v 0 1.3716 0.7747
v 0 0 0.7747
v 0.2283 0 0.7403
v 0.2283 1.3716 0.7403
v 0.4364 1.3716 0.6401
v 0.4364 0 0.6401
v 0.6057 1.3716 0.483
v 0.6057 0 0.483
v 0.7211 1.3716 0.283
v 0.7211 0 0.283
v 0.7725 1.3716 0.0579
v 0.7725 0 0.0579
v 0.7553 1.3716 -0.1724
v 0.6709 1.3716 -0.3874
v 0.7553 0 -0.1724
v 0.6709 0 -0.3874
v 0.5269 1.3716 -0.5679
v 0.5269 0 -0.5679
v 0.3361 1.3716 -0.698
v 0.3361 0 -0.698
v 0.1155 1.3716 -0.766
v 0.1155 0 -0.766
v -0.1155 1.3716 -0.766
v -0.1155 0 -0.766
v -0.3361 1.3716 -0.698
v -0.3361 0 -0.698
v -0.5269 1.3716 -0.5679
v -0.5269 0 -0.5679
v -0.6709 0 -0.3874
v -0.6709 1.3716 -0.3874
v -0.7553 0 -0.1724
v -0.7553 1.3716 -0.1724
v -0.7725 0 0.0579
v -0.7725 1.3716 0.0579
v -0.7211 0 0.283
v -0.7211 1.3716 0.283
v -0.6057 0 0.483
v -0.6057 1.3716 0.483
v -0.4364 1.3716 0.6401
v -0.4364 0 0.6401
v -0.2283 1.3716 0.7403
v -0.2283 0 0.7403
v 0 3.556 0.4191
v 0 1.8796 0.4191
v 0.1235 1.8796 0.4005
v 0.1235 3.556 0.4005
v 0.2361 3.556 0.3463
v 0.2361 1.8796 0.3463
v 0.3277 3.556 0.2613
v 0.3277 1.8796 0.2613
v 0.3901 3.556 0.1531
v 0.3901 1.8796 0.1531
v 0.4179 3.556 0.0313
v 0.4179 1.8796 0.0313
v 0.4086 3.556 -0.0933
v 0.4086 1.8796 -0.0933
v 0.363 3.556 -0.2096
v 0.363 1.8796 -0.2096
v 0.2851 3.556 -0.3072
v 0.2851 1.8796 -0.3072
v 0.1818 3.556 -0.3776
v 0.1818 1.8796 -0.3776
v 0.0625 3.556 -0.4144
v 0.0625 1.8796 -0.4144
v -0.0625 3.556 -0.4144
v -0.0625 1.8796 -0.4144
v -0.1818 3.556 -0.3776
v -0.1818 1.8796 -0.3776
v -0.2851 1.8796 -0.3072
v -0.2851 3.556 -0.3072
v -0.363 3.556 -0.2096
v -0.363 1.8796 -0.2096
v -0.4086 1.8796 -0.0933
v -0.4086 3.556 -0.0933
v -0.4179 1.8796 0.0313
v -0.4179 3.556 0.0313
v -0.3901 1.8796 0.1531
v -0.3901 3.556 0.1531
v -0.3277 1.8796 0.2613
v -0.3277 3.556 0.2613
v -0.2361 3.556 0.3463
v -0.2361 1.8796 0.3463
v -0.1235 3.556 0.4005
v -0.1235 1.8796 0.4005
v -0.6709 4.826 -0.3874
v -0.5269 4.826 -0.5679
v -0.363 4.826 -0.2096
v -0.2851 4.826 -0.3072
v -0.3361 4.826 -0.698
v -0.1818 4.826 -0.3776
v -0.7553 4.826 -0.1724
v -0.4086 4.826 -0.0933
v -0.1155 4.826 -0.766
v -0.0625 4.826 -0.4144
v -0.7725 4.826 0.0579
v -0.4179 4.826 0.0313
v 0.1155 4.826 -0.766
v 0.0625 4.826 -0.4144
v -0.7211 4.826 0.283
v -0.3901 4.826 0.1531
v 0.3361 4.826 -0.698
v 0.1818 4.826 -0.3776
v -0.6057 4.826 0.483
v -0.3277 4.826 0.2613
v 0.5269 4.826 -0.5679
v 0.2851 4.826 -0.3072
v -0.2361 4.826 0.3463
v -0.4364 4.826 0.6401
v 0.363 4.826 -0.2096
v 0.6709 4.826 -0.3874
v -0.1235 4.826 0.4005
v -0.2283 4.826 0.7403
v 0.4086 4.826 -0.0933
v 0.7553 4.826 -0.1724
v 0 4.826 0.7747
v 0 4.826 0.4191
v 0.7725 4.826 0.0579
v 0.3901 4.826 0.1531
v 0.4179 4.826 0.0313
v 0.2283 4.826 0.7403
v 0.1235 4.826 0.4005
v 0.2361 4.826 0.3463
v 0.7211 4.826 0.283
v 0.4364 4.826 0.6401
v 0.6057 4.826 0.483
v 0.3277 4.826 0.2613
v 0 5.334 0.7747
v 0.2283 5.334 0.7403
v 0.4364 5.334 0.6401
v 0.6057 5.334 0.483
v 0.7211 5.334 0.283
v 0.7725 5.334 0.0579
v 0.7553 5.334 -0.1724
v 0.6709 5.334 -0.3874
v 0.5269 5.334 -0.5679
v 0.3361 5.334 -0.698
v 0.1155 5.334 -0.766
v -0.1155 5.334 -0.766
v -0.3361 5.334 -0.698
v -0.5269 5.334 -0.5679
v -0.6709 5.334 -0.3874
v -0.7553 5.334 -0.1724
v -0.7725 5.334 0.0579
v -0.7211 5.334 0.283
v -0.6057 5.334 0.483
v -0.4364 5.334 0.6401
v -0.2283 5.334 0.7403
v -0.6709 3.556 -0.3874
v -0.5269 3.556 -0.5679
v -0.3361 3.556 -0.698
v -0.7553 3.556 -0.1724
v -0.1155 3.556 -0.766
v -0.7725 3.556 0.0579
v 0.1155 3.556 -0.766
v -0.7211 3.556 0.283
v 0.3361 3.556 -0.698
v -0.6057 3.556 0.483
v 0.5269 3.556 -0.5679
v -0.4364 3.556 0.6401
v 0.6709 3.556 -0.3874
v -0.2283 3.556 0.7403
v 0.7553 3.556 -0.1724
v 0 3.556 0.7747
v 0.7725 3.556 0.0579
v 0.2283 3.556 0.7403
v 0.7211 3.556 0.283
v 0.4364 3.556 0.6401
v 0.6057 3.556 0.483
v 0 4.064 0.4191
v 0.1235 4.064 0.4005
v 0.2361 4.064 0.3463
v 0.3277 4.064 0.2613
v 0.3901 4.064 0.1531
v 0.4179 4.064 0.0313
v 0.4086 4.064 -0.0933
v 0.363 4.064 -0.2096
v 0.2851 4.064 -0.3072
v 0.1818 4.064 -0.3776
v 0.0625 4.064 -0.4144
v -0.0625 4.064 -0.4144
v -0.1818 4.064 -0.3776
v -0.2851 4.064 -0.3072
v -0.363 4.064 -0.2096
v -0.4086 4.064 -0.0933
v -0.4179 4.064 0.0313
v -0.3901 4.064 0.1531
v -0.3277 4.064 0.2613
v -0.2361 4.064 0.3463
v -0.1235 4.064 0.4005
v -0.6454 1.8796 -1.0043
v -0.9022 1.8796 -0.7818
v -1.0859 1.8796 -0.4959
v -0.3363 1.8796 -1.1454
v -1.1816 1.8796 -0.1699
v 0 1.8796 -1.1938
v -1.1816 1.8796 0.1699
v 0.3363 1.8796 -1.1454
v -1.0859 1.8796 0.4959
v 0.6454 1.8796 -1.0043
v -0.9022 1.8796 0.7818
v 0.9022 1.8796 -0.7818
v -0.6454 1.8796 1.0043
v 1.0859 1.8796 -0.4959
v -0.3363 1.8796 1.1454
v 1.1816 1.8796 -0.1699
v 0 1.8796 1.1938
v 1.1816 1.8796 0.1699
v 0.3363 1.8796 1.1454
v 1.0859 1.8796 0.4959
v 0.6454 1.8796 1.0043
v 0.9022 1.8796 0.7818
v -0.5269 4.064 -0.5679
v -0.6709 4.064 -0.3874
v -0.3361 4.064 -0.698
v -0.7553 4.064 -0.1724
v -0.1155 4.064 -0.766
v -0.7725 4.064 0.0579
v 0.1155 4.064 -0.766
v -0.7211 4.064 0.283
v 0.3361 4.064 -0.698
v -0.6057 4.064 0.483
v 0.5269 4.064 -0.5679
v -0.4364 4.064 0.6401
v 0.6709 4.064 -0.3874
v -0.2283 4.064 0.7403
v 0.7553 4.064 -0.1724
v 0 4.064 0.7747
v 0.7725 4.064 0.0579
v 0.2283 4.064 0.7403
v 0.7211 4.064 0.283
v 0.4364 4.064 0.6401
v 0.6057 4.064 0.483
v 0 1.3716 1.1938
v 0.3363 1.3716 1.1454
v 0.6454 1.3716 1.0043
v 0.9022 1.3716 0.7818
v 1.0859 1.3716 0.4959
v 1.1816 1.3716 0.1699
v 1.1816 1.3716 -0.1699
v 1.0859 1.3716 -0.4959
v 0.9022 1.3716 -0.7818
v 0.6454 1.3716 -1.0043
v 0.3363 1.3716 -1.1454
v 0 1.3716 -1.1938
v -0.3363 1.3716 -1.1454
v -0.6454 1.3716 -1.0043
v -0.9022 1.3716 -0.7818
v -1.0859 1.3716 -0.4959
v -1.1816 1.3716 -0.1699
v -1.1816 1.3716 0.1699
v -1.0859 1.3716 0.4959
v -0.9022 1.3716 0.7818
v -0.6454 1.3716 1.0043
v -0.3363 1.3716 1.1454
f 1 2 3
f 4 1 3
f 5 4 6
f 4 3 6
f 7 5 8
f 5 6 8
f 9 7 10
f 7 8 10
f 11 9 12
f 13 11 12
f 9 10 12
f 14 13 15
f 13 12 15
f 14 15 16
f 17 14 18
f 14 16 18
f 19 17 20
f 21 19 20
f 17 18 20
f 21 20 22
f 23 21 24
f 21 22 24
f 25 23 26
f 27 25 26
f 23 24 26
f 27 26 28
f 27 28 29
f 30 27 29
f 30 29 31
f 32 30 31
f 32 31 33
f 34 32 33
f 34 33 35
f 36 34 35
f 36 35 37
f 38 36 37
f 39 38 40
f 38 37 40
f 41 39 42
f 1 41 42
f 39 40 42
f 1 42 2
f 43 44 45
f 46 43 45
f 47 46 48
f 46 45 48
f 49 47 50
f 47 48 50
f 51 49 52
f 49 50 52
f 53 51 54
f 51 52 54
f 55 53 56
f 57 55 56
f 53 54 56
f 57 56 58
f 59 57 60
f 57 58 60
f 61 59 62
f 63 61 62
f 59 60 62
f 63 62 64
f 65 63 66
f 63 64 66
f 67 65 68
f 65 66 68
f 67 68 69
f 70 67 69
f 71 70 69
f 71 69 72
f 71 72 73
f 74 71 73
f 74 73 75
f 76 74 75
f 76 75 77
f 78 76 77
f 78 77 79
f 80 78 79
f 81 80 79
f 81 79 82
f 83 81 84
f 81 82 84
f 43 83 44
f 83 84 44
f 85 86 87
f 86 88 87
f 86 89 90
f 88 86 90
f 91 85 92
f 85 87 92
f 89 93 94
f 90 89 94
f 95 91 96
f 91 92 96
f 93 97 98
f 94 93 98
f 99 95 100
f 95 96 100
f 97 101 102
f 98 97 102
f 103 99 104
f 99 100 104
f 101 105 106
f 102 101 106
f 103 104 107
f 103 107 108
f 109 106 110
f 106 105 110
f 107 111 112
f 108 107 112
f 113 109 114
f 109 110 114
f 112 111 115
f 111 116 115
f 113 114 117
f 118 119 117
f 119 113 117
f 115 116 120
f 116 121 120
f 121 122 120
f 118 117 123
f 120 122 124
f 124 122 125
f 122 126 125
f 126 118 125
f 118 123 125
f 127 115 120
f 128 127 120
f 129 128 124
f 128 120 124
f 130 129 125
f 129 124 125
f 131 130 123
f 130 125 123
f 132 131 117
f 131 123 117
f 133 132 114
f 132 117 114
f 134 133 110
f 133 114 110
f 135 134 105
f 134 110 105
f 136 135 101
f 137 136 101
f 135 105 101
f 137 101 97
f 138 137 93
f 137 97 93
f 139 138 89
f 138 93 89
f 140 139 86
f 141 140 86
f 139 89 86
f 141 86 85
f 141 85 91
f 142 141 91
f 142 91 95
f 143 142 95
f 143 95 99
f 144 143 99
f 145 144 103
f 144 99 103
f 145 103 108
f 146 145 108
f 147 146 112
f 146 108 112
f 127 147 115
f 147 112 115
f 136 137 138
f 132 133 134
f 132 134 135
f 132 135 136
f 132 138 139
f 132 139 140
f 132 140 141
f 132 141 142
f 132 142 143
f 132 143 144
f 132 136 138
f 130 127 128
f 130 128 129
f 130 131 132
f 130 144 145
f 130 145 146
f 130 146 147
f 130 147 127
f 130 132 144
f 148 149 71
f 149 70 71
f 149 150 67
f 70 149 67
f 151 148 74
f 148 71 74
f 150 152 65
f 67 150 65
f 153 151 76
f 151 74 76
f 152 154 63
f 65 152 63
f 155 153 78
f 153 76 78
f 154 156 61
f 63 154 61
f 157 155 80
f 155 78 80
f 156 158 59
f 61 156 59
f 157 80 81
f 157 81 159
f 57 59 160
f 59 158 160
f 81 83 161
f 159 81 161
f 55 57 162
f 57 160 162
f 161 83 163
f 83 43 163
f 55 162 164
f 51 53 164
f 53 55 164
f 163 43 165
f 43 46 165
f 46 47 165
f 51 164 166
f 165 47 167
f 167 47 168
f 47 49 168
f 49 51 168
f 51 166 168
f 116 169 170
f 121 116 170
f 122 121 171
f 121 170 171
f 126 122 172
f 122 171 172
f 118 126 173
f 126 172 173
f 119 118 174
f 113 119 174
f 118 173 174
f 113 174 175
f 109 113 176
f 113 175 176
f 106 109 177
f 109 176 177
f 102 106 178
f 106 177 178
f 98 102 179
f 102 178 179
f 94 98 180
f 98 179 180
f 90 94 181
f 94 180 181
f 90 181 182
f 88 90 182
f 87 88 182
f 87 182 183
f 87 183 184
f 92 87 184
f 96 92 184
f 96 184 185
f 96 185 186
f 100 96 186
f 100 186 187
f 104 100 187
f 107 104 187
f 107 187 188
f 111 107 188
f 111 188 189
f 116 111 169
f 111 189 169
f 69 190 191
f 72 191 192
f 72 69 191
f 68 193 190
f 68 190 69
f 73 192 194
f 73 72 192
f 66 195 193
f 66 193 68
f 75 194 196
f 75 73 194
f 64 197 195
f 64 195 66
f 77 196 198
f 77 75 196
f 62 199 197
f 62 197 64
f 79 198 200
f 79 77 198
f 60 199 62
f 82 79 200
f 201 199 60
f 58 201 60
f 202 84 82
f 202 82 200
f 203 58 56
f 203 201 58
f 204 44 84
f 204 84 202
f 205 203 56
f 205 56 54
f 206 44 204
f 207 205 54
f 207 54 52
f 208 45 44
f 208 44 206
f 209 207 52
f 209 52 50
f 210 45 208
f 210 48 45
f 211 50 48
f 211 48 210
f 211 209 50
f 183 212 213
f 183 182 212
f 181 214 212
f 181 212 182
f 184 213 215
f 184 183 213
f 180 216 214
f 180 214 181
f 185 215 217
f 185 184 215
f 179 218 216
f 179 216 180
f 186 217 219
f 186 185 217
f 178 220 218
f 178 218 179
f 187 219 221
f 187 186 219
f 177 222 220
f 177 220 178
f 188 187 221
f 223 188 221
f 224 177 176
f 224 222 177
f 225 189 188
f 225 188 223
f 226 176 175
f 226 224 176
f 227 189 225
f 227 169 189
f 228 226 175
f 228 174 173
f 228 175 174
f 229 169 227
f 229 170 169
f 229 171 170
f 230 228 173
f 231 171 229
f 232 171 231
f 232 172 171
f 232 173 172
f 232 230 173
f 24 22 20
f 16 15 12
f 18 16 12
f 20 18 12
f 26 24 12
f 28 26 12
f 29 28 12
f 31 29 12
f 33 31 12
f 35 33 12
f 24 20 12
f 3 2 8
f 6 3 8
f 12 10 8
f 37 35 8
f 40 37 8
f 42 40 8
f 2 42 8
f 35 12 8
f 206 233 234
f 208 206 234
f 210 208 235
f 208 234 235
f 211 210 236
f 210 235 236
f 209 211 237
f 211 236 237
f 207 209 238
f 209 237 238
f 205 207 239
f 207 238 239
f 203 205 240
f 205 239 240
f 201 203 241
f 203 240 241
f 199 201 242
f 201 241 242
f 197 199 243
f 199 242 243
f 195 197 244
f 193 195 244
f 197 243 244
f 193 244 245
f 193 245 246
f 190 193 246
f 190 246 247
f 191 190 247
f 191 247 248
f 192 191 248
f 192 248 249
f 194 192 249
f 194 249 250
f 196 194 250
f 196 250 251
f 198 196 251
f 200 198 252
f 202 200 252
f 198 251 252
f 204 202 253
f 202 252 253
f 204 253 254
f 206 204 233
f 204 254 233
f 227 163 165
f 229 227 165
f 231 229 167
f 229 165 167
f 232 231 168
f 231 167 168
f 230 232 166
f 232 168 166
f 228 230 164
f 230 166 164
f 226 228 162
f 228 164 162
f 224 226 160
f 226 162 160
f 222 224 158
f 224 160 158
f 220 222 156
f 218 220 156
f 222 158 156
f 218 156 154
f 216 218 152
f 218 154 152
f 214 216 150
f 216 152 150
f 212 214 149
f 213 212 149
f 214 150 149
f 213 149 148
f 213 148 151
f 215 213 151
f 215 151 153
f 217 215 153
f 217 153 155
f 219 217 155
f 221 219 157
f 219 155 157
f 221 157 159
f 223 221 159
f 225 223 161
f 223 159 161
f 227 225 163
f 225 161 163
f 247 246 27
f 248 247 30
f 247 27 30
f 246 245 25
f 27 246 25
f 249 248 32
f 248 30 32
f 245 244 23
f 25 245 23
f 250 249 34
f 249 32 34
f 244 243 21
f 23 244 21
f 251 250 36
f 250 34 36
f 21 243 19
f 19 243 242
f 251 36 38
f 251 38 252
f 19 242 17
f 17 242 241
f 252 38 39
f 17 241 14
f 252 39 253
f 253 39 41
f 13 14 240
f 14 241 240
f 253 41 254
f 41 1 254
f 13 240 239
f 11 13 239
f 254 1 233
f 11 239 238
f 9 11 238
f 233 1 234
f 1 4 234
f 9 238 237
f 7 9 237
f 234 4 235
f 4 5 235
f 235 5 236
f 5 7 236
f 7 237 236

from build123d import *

# Parameters (mm, degrees)
CROQUIS2_R              = 0.7747
SALIENTE_EXTRUIR1_DEPTH = 1.3716
CROQUIS3_R              = 1.1938
SALIENTE_EXTRUIR2_DEPTH = 0.508
CROQUIS4_R              = 0.4191
SALIENTE_EXTRUIR3_DEPTH = 1.6764
CROQUIS5_R              = 0.7747
SALIENTE_EXTRUIR4_DEPTH = 0.508
CROQUIS6_R              = 0.4191
SALIENTE_EXTRUIR5_DEPTH = 0.762
CROQUIS7_R              = 0.7747
SALIENTE_EXTRUIR6_DEPTH = 0.508


with BuildPart() as part:
    # Croquis2 → Saliente-Extruir1 (new body)
    with BuildSketch(Plane(origin=(0, 0, 0), x_dir=(1, 0, 0), z_dir=(0, 1, 0))):
        with Locations(Location((0, 0, 0), (0, 0, 270))):
            Circle(CROQUIS2_R)
    extrude(amount=SALIENTE_EXTRUIR1_DEPTH)

    # Croquis3 → Saliente-Extruir2 (add)
    with BuildSketch(Plane(origin=(0, 1.3716, 0), x_dir=(1, 0, 0), z_dir=(0, 1, 0))):
        with Locations(Location((0, 0, 0), (0, 0, 270))):
            Circle(CROQUIS3_R)
    extrude(amount=SALIENTE_EXTRUIR2_DEPTH)

    # Croquis4 → Saliente-Extruir3 (add)
    with BuildSketch(Plane(origin=(0, 1.8796, 0), x_dir=(1, 0, 0), z_dir=(0, 1, 0))):
        with Locations(Location((0, 0, 0), (0, 0, 270))):
            Circle(CROQUIS4_R)
    extrude(amount=SALIENTE_EXTRUIR3_DEPTH)

    # Croquis5 → Saliente-Extruir4 (add)
    with BuildSketch(Plane(origin=(0, 3.556, 0), x_dir=(1, 0, 0), z_dir=(0, 1, 0))):
        with Locations(Location((0, 0, 0), (0, 0, 270))):
            Circle(CROQUIS5_R)
    extrude(amount=SALIENTE_EXTRUIR4_DEPTH)

    # Croquis6 → Saliente-Extruir5 (add)
    with BuildSketch(Plane(origin=(0, 4.064, 0), x_dir=(1, 0, 0), z_dir=(0, 1, 0))):
        with Locations(Location((0, 0, 0), (0, 0, 270))):
            Circle(CROQUIS6_R)
    extrude(amount=SALIENTE_EXTRUIR5_DEPTH)

    # Croquis7 → Saliente-Extruir6 (add)
    with BuildSketch(Plane(origin=(0, 4.826, 0), x_dir=(1, 0, 0), z_dir=(0, 1, 0))):
        with Locations(Location((0, 0, 0), (0, 0, 270))):
            Circle(CROQUIS7_R)
    extrude(amount=SALIENTE_EXTRUIR6_DEPTH)


solid = part.part
